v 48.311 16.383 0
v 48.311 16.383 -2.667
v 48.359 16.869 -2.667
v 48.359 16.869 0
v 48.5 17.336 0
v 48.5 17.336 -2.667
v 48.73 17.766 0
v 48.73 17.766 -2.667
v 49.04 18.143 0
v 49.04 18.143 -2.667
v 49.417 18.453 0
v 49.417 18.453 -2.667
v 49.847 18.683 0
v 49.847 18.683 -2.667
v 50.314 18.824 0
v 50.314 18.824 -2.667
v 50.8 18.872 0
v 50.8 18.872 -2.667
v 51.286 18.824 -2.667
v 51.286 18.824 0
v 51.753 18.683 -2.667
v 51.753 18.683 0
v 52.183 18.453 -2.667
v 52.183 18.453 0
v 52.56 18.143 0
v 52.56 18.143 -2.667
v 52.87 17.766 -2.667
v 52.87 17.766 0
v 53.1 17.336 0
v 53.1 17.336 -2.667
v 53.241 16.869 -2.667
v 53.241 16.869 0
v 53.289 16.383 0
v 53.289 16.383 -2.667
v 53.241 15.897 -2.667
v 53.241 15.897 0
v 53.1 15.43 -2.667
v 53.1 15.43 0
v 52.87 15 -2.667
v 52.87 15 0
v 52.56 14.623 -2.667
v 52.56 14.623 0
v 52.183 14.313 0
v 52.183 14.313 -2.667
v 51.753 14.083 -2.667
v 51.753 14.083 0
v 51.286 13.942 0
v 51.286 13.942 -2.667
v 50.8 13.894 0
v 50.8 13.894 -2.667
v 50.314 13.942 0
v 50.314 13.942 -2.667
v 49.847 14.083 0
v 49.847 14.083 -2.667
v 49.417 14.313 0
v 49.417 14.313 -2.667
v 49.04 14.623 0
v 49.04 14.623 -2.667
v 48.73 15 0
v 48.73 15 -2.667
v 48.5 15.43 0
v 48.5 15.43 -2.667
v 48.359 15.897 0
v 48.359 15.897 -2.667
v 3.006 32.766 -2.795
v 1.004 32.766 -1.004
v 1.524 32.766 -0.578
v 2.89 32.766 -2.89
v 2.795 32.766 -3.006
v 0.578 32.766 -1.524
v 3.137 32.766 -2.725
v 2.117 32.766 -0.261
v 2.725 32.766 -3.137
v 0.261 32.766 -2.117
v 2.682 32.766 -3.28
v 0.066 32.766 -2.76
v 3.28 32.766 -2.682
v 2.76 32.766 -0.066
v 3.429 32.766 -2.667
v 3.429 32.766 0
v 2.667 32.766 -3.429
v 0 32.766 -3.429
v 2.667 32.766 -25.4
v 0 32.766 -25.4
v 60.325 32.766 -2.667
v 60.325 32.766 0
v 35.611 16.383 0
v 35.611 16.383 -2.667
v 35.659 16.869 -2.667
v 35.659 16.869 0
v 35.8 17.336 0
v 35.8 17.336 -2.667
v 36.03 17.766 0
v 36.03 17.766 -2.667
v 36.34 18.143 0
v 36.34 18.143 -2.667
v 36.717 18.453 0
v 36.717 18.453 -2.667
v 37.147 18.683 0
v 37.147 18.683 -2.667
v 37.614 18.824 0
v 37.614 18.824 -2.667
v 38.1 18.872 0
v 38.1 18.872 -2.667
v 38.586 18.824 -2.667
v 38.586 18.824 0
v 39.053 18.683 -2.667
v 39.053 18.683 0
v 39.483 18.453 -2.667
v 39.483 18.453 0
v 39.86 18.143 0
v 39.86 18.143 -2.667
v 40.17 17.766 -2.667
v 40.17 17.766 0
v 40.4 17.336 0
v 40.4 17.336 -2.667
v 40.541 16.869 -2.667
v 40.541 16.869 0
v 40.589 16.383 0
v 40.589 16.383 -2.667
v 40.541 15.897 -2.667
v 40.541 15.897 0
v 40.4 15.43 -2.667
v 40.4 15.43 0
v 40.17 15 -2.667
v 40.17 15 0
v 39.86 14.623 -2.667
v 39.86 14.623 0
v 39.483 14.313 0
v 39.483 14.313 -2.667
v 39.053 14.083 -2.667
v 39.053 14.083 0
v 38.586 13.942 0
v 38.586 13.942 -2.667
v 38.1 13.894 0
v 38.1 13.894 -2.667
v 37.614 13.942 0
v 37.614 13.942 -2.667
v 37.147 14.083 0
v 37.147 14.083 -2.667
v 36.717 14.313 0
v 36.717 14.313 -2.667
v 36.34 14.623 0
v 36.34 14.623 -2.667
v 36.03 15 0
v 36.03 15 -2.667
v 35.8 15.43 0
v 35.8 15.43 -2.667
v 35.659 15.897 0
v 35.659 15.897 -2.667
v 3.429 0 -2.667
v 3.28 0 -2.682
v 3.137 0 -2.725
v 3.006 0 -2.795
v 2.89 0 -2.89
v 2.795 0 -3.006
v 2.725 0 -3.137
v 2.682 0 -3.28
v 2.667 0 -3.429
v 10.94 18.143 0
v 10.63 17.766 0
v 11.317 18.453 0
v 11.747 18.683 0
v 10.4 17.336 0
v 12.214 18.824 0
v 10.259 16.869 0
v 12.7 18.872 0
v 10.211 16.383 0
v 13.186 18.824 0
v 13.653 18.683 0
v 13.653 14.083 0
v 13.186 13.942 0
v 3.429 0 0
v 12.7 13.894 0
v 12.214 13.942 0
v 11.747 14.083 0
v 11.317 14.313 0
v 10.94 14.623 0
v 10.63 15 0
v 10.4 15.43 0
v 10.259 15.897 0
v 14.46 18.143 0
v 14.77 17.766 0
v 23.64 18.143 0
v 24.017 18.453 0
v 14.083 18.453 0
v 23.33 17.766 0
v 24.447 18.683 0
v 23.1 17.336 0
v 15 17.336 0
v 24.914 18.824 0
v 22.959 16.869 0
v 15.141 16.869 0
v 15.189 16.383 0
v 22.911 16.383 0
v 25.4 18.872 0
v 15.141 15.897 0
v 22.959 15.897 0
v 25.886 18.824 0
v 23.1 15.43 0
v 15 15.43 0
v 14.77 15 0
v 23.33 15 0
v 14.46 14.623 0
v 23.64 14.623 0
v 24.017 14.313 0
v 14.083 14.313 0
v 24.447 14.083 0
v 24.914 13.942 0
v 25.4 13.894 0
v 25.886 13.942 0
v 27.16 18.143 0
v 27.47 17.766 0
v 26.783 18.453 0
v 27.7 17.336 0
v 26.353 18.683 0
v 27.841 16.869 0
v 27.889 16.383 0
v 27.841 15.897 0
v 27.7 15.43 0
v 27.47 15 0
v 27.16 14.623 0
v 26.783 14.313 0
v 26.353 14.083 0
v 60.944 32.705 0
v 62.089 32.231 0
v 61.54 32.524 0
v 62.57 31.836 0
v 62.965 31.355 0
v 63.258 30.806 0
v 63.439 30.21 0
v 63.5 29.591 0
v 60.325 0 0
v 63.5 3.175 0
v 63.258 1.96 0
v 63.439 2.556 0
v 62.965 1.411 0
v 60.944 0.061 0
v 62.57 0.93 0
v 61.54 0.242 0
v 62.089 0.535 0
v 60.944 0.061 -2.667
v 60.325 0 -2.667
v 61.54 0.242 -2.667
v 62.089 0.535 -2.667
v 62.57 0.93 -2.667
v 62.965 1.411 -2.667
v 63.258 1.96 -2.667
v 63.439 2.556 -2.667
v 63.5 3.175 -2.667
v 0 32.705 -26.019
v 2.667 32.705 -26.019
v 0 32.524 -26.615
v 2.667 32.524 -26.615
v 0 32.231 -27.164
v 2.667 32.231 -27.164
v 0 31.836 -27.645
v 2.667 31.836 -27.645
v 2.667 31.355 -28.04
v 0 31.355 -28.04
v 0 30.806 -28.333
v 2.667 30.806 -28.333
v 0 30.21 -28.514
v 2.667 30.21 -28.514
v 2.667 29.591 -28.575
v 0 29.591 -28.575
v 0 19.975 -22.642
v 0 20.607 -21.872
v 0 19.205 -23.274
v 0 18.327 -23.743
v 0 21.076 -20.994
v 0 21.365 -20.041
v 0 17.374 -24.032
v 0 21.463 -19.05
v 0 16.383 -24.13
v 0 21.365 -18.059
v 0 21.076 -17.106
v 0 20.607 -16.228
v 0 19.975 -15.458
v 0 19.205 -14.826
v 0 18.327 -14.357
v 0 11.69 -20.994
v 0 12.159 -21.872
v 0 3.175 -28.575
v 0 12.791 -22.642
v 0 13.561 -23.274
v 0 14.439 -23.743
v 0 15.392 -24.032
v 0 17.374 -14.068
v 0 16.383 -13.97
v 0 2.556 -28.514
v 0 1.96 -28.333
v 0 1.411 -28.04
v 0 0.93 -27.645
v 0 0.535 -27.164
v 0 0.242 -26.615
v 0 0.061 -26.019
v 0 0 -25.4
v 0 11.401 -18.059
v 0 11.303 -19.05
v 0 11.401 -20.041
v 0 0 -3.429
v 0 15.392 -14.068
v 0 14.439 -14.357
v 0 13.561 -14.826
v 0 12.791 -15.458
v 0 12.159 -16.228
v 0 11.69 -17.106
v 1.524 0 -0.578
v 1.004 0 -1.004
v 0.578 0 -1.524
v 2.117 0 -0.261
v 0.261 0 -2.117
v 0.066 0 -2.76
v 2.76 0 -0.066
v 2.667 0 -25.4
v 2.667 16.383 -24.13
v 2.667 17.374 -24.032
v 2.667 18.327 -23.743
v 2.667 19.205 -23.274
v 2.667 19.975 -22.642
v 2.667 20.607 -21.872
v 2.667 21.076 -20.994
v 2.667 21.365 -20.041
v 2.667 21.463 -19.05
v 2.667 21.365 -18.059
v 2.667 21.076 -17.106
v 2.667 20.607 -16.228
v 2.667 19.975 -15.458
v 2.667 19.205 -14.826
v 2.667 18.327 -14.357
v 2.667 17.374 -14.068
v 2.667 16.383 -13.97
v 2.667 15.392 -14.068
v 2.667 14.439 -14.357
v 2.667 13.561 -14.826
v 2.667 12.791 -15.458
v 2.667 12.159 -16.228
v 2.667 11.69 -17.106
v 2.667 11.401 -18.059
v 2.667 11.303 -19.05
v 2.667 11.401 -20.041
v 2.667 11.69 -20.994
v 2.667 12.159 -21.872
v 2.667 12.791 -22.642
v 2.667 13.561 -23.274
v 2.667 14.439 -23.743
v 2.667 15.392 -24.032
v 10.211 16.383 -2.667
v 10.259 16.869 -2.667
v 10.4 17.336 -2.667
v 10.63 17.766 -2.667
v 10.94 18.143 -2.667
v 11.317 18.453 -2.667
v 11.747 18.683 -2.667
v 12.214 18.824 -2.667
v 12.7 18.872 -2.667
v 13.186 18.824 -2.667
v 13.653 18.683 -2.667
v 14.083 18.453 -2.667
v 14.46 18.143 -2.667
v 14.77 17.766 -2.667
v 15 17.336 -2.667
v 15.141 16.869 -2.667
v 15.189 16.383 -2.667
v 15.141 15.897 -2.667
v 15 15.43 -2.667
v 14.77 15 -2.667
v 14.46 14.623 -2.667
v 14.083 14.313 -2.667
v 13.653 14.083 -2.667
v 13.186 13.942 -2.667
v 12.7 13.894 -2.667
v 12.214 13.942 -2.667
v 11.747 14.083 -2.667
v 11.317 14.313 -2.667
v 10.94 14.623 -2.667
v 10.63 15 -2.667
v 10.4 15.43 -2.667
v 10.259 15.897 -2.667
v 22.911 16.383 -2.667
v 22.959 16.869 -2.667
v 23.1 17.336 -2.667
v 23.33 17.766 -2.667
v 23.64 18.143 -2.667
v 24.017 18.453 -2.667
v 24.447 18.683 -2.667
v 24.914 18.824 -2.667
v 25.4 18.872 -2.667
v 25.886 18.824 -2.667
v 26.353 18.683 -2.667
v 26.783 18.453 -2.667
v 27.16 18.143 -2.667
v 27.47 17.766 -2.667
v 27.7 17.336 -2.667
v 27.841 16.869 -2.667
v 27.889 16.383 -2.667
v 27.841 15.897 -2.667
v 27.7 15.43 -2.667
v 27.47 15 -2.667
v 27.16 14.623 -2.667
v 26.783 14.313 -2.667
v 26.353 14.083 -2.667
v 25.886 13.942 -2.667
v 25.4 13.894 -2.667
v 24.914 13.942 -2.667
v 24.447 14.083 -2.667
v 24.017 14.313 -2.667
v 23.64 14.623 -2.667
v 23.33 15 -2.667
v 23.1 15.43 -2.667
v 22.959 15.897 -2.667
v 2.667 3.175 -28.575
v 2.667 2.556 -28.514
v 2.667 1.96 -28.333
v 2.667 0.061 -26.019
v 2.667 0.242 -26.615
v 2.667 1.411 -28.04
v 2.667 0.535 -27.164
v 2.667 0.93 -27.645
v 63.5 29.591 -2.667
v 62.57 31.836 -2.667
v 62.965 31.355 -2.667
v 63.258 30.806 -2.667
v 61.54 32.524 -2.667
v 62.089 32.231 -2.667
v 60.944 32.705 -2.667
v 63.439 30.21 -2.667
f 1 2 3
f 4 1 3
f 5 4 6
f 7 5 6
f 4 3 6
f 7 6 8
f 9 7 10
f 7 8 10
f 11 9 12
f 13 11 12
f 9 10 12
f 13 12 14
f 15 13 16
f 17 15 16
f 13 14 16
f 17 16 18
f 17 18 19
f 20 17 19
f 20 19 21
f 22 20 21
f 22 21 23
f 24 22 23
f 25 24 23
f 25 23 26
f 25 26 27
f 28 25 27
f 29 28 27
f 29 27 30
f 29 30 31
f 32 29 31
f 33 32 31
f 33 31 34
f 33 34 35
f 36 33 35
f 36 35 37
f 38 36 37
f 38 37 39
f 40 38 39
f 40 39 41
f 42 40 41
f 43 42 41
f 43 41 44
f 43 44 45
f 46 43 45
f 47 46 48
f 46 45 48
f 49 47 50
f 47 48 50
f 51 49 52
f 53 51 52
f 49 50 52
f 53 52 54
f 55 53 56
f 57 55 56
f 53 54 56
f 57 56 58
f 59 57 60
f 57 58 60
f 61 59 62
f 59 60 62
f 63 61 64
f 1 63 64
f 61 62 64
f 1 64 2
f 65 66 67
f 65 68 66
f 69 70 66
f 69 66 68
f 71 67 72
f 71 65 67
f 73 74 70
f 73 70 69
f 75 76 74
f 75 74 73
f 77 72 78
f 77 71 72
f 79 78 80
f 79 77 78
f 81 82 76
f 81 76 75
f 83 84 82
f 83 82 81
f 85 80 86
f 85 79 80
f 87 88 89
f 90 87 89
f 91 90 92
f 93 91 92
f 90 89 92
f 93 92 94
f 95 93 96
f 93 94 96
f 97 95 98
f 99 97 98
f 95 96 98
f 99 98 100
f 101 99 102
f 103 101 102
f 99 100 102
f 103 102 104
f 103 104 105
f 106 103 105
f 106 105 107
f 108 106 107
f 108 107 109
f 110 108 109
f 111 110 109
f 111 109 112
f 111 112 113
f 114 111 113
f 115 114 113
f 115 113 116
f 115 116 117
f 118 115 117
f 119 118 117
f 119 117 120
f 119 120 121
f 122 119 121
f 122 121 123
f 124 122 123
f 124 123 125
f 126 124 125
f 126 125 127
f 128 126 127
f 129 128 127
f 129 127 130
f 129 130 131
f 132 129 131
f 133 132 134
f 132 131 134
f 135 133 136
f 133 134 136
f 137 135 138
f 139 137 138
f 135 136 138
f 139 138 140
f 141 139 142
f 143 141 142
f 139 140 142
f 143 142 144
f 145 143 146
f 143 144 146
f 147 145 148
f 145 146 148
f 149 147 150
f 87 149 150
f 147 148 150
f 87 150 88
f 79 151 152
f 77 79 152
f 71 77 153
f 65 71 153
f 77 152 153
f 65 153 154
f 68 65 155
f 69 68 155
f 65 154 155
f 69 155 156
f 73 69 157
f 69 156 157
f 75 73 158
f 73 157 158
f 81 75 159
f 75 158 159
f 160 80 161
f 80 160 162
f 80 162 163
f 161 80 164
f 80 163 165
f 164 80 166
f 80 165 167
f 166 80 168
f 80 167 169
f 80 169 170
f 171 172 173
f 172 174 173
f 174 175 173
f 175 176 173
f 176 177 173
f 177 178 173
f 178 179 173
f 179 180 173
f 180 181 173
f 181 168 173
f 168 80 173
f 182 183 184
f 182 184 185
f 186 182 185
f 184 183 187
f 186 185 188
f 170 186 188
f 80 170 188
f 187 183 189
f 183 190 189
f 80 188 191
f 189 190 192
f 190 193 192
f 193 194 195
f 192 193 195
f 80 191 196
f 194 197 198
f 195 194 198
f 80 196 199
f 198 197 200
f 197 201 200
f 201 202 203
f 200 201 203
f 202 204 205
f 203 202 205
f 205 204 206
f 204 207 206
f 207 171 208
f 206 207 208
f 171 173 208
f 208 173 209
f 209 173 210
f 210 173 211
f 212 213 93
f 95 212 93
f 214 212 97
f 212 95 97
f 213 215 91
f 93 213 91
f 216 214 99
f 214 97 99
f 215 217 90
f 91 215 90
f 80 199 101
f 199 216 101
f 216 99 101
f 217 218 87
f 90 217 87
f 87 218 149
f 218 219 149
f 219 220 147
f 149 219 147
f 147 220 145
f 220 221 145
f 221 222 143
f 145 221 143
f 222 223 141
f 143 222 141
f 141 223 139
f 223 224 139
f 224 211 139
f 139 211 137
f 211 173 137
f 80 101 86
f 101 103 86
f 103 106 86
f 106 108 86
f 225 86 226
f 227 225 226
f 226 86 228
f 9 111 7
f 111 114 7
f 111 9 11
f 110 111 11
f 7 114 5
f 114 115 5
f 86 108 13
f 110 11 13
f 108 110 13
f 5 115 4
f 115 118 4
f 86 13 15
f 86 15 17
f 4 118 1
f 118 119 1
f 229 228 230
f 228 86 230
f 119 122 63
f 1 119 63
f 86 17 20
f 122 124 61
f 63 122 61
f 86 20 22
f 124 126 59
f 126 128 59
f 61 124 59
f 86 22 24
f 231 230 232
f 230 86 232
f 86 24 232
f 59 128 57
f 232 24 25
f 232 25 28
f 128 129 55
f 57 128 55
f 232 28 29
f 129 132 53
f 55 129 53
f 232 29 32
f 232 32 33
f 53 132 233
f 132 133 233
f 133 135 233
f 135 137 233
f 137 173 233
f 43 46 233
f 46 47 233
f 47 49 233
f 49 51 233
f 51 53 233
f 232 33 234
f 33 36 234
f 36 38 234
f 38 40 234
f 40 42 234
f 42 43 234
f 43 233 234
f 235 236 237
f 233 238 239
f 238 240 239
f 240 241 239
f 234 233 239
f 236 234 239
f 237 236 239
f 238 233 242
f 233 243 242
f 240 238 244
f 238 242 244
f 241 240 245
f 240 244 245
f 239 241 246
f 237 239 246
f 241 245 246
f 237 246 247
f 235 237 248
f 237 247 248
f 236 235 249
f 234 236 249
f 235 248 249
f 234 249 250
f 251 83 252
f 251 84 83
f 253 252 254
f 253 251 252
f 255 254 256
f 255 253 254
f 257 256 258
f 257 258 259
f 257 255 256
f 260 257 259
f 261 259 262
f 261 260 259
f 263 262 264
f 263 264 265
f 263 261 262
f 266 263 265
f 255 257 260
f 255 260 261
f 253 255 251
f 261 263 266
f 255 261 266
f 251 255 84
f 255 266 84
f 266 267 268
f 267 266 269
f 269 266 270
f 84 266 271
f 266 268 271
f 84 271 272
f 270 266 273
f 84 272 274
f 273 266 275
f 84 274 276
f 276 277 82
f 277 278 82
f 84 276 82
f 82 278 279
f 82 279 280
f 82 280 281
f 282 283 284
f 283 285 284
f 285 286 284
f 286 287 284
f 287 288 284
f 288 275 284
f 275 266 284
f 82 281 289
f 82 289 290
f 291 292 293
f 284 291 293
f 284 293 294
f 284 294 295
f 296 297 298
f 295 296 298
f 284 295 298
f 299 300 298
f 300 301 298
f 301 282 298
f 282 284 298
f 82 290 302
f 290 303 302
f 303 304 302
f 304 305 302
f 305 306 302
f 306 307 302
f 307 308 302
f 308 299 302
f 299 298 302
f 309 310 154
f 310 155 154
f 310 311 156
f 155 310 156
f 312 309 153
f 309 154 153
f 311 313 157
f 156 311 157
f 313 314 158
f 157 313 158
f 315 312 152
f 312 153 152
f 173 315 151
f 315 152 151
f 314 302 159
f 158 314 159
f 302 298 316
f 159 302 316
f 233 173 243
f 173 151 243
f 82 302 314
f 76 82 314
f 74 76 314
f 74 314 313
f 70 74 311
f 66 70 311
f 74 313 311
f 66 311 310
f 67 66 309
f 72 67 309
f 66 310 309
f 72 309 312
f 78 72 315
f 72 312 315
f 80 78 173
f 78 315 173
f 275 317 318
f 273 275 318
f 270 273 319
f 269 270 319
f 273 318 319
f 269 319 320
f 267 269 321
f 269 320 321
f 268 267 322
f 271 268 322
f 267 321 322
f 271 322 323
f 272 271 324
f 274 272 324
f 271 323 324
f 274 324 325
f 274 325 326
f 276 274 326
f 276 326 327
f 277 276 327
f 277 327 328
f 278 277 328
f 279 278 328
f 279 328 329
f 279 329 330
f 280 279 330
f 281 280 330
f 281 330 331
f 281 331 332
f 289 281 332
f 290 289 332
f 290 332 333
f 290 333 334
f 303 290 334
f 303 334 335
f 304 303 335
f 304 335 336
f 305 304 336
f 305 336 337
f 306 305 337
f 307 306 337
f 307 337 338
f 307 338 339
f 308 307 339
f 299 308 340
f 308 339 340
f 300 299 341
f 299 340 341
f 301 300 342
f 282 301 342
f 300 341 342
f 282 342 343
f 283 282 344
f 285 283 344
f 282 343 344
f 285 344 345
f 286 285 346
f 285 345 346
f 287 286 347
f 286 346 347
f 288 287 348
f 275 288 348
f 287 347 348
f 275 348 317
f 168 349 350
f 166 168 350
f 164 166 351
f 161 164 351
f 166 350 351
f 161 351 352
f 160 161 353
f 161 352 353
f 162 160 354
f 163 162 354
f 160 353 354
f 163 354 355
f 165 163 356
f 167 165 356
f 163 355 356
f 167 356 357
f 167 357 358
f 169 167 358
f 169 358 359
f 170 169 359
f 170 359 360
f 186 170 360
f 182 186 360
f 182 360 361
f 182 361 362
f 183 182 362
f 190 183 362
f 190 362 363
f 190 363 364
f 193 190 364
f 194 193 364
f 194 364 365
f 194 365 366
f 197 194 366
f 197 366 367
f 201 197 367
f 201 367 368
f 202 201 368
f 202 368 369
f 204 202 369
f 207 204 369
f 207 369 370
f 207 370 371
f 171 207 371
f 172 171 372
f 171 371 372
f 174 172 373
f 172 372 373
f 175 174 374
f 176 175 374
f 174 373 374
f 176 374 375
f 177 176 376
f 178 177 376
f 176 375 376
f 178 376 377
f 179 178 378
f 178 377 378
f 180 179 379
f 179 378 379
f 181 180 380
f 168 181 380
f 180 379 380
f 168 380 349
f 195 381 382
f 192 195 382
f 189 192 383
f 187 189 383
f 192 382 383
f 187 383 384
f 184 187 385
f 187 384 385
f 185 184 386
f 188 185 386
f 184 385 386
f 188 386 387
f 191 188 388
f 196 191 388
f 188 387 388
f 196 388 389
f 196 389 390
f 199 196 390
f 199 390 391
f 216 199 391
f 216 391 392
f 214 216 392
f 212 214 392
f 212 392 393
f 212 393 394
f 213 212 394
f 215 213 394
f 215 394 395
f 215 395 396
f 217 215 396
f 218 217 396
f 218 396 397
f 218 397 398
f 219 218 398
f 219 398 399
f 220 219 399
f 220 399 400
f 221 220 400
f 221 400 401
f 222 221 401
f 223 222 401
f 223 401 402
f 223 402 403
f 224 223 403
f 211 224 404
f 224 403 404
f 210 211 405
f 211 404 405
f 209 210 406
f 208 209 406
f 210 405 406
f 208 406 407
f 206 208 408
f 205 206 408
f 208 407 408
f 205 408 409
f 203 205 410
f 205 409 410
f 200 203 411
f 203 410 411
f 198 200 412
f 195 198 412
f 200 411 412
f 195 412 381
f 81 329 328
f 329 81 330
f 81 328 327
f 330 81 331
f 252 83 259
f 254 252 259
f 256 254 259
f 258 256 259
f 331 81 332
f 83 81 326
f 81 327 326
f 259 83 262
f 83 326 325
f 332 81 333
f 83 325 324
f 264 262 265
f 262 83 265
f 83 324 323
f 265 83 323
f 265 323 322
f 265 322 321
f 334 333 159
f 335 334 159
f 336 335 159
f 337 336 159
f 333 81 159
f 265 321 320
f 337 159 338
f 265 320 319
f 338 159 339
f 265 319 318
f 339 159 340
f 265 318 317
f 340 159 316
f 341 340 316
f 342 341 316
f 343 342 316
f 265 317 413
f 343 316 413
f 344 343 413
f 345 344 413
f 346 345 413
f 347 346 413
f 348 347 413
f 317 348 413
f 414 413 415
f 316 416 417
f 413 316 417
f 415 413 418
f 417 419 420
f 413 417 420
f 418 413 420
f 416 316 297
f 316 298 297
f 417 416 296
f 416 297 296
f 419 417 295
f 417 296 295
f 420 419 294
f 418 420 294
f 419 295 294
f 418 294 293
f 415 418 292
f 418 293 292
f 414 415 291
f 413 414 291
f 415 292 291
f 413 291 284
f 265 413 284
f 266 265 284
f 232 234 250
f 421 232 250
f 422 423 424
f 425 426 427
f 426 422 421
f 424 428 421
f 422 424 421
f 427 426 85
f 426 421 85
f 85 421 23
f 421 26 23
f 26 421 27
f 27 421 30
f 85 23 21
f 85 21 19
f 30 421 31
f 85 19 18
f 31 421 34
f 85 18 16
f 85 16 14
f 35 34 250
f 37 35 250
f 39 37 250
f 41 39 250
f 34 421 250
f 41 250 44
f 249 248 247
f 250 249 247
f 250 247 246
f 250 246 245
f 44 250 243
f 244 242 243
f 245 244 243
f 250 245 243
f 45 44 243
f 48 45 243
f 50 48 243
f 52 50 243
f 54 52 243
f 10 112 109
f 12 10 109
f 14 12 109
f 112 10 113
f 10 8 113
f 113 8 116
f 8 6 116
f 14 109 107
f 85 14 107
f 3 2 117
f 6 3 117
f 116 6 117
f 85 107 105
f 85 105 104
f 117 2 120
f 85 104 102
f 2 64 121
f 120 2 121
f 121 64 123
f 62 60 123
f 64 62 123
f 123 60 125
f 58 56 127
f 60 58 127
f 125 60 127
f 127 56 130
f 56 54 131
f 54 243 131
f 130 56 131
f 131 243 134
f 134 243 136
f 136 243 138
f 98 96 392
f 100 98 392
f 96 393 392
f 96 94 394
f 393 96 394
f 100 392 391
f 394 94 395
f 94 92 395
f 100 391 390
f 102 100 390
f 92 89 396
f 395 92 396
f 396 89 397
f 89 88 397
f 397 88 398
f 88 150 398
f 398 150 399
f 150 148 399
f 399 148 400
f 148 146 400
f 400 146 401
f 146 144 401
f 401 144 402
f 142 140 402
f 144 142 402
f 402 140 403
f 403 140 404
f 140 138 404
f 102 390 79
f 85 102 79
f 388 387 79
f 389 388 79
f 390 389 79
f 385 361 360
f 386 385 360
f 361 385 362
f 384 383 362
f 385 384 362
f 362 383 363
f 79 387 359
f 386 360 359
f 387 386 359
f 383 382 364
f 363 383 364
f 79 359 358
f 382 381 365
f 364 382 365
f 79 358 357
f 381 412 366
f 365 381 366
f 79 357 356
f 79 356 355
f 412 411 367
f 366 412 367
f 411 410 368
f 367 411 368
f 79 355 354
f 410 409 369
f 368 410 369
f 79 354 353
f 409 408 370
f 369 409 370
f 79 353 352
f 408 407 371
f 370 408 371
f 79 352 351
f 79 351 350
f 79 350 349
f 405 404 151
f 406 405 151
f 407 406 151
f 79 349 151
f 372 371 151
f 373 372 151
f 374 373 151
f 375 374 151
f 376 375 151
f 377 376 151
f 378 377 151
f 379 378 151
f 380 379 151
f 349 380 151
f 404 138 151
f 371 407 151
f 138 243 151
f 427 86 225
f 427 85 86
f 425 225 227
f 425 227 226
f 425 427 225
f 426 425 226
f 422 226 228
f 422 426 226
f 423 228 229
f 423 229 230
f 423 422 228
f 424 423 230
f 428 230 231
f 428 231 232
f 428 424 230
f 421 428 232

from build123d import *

# Parameters (mm, degrees)
BASE_FLANGE1_DEPTH = 32.766
SKETCH6_R          = 2.4892
CUT_EXTRUDE1_DEPTH = 77.00713927
SKETCH7_R          = 5.08
CUT_EXTRUDE2_DEPTH = 75.771620753
FILLET1_R          = 3.175


# Read off the part's stored shape, not the designer's step: Base-Flange1
with BuildPart() as part:
    # Base-Flange1 outline → Base-Flange1 (new body)
    with BuildSketch(Plane(origin=(0, 0, 0), x_dir=(1, 0, 0), z_dir=(0, 1, 0))):
        with BuildLine():
            Line((3.429, 0), (63.5, 0))
            Line((63.5, 0), (63.5, 2.667))
            Line((63.5, 2.667), (3.429, 2.667))
            ThreePointArc((3.429, 2.667), (2.890184633, 2.890184633), (2.667, 3.429))
            Line((2.667, 3.429), (2.667, 28.575))
            Line((2.667, 28.575), (0, 28.575))
            Line((0, 28.575), (0, 3.429))
            ThreePointArc((0, 3.429), (1.004330847, 1.004330847), (3.429, 0))
        make_face()
    extrude(amount=BASE_FLANGE1_DEPTH)

    # Sketch6 → Cut-Extrude1 (cut, through all)
    with BuildSketch(Plane(origin=(0, 0, -2.667), x_dir=(-1, 0, 0), z_dir=(0, 0, -1))):
        with Locations((-50.8, 16.383)):
            Circle(SKETCH6_R)
        with Locations((-38.1, 16.383)):
            Circle(SKETCH6_R)
        with Locations((-25.4, 16.383)):
            Circle(SKETCH6_R)
        with Locations((-12.7, 16.383)):
            Circle(SKETCH6_R)
    extrude(amount=-CUT_EXTRUDE1_DEPTH, mode=Mode.SUBTRACT)

    # Sketch7 → Cut-Extrude2 (cut, through all)
    with BuildSketch(Plane(origin=(2.667, 0, 0), x_dir=(0, 0, -1), z_dir=(1, 0, 0))):
        with Locations((19.05, 16.383)):
            Circle(SKETCH7_R)
    extrude(amount=-CUT_EXTRUDE2_DEPTH, mode=Mode.SUBTRACT)

    # Fillet1
    fillet1_edges = [part.edges().sort_by_distance(p)[0] for p in [
        (1.3335, 32.766, -28.575),
        (1.3335, 0, -28.575),
        (63.5, 32.766, -1.3335),
        (63.5, 0, -1.3335),
    ]]
    fillet(fillet1_edges, radius=FILLET1_R)


solid = part.part
